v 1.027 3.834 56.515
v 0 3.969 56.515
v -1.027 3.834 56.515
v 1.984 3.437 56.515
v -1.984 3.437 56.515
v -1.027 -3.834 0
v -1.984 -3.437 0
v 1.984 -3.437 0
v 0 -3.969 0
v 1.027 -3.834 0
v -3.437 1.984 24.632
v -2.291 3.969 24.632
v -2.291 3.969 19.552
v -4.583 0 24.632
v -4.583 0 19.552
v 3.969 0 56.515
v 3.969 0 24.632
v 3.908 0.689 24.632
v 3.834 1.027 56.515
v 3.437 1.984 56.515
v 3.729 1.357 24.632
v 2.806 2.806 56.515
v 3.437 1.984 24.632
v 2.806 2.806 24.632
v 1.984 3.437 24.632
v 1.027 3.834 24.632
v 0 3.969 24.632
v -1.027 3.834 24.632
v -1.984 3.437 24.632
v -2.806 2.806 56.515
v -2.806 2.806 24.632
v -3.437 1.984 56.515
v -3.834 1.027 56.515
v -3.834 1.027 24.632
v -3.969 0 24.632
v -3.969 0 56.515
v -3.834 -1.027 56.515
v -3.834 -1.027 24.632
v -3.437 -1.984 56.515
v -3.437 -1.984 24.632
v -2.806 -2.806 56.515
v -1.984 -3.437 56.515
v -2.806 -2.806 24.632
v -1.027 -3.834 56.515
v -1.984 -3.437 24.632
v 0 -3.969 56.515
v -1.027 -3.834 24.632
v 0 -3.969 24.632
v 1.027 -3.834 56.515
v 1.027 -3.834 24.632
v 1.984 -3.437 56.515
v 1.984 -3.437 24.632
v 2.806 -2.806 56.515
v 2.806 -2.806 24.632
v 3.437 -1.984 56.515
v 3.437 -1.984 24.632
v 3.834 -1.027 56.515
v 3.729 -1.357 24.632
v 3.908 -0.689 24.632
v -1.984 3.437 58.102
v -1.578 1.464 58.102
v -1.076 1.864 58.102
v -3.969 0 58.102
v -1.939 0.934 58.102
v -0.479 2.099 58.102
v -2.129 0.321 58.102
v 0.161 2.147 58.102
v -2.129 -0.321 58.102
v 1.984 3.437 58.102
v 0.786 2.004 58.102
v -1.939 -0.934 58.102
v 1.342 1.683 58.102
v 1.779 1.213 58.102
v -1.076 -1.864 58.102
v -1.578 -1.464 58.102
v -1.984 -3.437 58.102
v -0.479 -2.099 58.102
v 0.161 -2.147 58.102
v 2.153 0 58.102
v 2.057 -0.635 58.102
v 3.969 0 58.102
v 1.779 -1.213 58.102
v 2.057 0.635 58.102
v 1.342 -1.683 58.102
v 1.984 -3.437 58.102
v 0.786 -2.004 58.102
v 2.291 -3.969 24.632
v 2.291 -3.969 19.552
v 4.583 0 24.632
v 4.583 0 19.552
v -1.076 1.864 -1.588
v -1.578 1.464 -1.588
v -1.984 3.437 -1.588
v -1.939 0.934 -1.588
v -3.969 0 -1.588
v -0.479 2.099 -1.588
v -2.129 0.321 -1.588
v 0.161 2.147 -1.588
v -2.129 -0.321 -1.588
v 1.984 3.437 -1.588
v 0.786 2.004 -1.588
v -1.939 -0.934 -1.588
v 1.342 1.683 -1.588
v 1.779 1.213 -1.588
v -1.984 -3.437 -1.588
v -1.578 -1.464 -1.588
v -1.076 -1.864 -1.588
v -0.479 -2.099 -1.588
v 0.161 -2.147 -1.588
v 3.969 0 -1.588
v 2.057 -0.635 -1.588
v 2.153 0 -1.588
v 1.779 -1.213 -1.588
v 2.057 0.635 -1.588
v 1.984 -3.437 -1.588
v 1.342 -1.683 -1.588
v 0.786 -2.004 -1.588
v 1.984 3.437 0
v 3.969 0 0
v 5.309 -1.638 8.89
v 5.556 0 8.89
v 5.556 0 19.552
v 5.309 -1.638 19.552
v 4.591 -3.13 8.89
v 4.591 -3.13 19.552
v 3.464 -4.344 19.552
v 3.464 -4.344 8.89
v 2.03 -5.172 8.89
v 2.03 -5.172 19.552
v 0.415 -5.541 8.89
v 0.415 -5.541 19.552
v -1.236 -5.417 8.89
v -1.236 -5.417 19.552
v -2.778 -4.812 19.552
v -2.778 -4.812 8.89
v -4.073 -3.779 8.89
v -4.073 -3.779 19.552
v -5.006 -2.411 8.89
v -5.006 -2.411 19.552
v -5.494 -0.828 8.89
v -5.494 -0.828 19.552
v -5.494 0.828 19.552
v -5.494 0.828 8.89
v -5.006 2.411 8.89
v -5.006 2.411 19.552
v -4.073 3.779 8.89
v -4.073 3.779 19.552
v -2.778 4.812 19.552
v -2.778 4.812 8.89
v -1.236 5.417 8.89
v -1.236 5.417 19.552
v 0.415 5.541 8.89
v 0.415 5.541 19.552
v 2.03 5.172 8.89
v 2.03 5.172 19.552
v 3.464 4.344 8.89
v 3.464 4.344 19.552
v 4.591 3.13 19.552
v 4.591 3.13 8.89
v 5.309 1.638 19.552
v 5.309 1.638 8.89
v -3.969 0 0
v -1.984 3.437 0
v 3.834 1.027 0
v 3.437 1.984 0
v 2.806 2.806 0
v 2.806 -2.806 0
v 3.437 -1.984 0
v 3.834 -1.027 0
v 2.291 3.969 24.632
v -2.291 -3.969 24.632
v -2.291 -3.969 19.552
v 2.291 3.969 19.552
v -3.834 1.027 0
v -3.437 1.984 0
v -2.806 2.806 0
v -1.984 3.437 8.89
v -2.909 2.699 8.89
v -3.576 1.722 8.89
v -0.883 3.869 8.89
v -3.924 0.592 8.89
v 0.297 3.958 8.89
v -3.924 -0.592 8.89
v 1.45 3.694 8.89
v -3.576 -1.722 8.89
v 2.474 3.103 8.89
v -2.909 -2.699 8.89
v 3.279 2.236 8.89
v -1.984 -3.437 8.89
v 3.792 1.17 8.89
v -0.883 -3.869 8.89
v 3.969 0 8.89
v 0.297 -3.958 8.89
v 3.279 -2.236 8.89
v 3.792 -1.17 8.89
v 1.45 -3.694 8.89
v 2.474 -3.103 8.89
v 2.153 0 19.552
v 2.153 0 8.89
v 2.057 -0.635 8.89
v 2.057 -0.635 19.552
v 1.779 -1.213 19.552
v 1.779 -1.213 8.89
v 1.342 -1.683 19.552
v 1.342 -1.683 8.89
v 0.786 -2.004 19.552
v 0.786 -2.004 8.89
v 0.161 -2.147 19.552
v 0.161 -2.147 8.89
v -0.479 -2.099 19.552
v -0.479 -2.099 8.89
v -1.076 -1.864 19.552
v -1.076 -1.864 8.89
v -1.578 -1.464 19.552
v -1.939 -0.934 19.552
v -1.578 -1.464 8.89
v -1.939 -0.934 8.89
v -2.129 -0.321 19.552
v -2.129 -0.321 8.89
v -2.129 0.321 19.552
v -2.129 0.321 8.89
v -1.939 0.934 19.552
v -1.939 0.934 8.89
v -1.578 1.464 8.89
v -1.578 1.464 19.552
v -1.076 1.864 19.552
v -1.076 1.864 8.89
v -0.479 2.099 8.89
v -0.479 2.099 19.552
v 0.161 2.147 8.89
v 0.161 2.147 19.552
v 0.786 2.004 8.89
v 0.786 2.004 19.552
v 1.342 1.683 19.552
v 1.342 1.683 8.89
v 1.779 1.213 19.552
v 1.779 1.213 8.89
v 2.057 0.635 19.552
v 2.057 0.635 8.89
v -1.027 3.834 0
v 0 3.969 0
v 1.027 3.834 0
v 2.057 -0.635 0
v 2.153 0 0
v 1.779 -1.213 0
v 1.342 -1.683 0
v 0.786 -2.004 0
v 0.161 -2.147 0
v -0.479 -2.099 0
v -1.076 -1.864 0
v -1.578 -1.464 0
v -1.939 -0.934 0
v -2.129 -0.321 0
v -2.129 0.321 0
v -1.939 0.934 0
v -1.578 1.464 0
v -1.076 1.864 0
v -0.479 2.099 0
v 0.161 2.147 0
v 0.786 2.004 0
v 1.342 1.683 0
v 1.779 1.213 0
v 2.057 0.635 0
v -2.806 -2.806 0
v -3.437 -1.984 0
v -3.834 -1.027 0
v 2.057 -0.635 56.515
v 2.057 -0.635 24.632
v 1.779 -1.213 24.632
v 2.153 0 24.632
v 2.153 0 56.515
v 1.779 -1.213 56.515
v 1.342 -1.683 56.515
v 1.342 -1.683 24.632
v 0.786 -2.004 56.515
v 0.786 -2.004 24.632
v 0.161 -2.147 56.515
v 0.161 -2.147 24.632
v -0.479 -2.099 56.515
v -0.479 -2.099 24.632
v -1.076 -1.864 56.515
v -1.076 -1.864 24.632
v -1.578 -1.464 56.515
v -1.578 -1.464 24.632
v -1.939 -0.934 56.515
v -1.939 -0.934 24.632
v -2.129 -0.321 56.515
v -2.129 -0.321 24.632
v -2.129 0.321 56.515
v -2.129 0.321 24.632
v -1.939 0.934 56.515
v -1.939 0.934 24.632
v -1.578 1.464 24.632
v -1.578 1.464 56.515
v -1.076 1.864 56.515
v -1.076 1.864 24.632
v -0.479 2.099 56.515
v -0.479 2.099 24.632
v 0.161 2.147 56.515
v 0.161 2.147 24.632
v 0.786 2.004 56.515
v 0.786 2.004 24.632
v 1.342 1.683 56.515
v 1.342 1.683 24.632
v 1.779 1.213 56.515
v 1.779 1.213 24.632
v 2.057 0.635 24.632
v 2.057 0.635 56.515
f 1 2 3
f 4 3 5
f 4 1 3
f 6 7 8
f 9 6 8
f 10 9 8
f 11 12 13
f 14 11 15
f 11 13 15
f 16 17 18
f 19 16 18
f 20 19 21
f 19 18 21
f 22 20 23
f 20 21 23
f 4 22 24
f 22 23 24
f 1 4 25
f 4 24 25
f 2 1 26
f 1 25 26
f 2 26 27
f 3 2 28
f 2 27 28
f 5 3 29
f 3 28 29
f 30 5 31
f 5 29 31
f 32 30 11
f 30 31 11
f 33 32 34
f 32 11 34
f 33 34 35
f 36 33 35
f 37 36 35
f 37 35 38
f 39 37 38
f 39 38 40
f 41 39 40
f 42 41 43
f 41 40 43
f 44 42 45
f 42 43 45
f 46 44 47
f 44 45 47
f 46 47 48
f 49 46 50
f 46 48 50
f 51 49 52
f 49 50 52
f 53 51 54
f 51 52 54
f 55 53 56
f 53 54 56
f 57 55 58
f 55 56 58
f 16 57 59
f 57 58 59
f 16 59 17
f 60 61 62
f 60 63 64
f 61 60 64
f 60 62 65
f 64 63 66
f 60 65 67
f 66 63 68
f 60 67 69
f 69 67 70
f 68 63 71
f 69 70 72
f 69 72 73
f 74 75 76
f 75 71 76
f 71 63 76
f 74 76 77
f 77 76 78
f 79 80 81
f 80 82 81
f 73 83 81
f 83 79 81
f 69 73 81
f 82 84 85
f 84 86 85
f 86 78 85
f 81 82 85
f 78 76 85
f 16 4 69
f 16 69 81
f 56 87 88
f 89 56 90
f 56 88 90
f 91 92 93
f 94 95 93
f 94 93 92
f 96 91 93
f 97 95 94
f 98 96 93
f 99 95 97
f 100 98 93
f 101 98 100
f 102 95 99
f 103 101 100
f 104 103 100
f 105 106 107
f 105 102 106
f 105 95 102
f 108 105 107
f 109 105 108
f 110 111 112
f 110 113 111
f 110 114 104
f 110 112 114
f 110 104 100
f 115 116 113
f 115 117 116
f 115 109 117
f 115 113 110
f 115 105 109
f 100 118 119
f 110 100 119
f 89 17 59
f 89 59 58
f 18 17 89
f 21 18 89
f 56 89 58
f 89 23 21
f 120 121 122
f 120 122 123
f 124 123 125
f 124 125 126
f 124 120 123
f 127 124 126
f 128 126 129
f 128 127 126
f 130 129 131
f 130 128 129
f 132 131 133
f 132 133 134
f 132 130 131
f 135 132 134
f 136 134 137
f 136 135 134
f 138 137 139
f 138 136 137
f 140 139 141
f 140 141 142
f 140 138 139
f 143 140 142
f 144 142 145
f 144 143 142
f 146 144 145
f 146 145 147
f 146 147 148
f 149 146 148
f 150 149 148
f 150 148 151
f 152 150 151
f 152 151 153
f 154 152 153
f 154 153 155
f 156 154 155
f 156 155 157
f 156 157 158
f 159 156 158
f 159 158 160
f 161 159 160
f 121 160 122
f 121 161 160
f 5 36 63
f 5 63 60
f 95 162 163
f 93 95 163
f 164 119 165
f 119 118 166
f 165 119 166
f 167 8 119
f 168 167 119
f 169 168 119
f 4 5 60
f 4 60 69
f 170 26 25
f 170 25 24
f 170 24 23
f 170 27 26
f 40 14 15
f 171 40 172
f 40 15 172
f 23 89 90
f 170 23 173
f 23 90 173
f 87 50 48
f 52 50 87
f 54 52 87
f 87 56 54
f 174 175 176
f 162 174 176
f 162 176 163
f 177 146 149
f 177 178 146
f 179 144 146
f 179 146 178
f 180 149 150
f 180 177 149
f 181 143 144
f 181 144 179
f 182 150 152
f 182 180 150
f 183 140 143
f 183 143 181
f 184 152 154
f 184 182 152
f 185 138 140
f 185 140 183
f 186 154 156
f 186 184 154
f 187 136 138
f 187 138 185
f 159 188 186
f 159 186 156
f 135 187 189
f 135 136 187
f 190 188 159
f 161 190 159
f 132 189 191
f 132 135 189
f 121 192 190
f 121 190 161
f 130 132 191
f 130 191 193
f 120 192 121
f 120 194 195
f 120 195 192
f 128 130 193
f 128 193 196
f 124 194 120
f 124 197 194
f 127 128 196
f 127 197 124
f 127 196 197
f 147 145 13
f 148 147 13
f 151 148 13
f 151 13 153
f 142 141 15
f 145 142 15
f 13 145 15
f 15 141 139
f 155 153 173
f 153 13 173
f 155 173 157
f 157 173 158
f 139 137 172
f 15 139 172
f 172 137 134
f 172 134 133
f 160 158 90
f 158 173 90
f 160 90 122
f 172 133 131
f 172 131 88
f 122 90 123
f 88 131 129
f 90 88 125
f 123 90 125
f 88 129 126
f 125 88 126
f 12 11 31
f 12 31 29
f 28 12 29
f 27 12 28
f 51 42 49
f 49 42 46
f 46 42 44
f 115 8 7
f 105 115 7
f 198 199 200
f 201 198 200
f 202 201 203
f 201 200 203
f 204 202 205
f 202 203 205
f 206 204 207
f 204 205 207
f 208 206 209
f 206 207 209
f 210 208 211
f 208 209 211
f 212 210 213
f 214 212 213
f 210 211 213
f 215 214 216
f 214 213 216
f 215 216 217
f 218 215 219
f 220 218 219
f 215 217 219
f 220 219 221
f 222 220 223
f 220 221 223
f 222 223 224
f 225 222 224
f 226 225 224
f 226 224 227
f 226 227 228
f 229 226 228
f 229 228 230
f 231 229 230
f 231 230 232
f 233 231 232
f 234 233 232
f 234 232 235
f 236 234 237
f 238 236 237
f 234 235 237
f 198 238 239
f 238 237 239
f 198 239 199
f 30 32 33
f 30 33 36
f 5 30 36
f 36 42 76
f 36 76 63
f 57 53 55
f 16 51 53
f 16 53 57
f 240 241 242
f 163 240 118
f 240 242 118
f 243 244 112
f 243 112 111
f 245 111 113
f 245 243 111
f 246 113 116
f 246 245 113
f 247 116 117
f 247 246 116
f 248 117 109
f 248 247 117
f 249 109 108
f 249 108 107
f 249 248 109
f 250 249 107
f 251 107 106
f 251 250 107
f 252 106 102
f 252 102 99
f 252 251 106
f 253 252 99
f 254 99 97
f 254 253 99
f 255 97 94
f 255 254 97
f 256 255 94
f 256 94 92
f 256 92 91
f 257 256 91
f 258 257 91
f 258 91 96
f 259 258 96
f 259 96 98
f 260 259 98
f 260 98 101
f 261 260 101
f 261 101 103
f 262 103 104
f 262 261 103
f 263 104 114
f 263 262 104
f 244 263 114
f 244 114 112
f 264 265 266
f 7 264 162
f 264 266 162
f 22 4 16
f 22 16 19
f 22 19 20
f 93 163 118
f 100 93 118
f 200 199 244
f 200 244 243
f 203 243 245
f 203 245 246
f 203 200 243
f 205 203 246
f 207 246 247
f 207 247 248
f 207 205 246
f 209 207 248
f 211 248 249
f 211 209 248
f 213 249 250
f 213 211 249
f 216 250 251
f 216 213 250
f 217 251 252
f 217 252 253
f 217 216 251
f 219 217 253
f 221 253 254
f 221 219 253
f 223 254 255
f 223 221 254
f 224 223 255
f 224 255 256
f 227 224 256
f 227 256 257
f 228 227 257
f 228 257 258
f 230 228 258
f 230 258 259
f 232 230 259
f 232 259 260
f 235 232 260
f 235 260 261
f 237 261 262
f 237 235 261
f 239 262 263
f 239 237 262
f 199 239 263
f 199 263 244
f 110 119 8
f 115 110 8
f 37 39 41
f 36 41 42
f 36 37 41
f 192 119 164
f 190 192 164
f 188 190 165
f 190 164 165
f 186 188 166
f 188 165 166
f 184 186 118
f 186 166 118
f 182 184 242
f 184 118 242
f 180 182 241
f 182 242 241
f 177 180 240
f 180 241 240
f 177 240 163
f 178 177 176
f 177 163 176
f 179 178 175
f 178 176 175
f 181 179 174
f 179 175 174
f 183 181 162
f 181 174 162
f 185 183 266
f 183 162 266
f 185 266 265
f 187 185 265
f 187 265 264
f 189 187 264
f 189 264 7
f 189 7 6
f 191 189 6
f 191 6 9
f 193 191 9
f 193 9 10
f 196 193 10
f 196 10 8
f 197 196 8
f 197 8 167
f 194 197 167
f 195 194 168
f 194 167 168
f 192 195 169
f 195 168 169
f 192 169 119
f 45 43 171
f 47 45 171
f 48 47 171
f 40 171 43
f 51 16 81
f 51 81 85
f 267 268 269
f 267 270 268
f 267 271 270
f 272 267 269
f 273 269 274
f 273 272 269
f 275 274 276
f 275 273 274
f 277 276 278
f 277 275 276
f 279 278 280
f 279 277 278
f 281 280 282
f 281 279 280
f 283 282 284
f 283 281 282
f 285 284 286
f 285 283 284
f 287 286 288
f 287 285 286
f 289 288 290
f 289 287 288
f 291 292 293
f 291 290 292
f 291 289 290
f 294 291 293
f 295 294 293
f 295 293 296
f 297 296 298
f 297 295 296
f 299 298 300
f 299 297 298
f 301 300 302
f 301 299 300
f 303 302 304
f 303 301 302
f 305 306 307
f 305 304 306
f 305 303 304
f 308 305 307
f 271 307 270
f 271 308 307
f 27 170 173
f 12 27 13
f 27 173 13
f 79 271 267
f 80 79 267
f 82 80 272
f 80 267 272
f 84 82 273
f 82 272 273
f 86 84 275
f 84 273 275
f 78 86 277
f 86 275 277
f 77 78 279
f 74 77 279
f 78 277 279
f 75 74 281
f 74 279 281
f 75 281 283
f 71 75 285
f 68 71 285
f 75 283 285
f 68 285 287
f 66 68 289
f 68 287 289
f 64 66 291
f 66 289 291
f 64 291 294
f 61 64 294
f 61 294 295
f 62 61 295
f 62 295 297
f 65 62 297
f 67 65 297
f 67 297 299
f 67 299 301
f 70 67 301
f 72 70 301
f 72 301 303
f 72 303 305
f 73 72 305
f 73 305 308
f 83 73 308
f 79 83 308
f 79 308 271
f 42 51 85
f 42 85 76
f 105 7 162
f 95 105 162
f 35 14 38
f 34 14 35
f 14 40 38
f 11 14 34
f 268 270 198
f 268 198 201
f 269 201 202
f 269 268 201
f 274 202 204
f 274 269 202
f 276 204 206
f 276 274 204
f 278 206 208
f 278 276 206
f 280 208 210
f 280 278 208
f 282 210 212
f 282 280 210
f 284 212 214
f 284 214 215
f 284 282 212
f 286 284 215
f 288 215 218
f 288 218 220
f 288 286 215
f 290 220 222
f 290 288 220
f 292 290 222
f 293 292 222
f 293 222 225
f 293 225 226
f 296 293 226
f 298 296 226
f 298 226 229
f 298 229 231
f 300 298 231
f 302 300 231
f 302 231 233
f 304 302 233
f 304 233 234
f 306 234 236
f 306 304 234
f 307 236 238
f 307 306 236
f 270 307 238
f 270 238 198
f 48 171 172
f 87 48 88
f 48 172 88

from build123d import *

# Parameters (mm, degrees)
F0_R          = 3.96875
F0_R_2        = 2.15265
F1_DEPTH      = 56.515
F3_R          = 2.15265
F4_DEPTH      = 1.5875
F4_DEPTH_BACK = 58.1025
F6_R          = 5.55625
F6_R_2        = 2.15265
F7_DEPTH      = 10.66165
F8_R          = 2.15265
F9_DEPTH      = 5.08


with BuildPart() as f1:
    # F0 (on Top) → F1 (new body)
    with BuildSketch(Plane.XY):
        Circle(F0_R)
        Circle(F0_R_2, mode=Mode.SUBTRACT)
    extrude(amount=F1_DEPTH)

    # F3 (on face) → F4 (join, two sides)
    with BuildSketch(Plane(origin=(0, 0, 0), x_dir=(1, 0, 0), z_dir=(0, 0, -1))) as f4_sk:
        Polygon((-1.984375, -3.4370383213), (1.984375, -3.4370383213), (3.96875, 0), (1.984375, 3.4370383213), (-1.984375, 3.4370383213), (-3.96875, 0), align=None)
        Circle(F3_R, mode=Mode.SUBTRACT)
    extrude(amount=F4_DEPTH)
    extrude(f4_sk.sketch, amount=-F4_DEPTH_BACK)

    # F6 (on offset) → F7 (join)
    with BuildSketch(Plane(origin=(0, 0, 8.89), x_dir=(1, 0, 0), z_dir=(0, 0, -1))):
        Circle(F6_R)
        Circle(F6_R_2, mode=Mode.SUBTRACT)
    extrude(amount=-F7_DEPTH)

    # F8 (on face) → F9 (join)
    with BuildSketch(Plane.XY.offset(19.55165)):
        Polygon((-2.2913588808, -3.96875), (2.2913588808, -3.96875), (4.5827177617, 0), (2.2913588808, 3.96875), (-2.2913588808, 3.96875), (-4.5827177617, 0), align=None)
        Circle(F8_R, mode=Mode.SUBTRACT)
    extrude(amount=F9_DEPTH)


solid = f1.part
